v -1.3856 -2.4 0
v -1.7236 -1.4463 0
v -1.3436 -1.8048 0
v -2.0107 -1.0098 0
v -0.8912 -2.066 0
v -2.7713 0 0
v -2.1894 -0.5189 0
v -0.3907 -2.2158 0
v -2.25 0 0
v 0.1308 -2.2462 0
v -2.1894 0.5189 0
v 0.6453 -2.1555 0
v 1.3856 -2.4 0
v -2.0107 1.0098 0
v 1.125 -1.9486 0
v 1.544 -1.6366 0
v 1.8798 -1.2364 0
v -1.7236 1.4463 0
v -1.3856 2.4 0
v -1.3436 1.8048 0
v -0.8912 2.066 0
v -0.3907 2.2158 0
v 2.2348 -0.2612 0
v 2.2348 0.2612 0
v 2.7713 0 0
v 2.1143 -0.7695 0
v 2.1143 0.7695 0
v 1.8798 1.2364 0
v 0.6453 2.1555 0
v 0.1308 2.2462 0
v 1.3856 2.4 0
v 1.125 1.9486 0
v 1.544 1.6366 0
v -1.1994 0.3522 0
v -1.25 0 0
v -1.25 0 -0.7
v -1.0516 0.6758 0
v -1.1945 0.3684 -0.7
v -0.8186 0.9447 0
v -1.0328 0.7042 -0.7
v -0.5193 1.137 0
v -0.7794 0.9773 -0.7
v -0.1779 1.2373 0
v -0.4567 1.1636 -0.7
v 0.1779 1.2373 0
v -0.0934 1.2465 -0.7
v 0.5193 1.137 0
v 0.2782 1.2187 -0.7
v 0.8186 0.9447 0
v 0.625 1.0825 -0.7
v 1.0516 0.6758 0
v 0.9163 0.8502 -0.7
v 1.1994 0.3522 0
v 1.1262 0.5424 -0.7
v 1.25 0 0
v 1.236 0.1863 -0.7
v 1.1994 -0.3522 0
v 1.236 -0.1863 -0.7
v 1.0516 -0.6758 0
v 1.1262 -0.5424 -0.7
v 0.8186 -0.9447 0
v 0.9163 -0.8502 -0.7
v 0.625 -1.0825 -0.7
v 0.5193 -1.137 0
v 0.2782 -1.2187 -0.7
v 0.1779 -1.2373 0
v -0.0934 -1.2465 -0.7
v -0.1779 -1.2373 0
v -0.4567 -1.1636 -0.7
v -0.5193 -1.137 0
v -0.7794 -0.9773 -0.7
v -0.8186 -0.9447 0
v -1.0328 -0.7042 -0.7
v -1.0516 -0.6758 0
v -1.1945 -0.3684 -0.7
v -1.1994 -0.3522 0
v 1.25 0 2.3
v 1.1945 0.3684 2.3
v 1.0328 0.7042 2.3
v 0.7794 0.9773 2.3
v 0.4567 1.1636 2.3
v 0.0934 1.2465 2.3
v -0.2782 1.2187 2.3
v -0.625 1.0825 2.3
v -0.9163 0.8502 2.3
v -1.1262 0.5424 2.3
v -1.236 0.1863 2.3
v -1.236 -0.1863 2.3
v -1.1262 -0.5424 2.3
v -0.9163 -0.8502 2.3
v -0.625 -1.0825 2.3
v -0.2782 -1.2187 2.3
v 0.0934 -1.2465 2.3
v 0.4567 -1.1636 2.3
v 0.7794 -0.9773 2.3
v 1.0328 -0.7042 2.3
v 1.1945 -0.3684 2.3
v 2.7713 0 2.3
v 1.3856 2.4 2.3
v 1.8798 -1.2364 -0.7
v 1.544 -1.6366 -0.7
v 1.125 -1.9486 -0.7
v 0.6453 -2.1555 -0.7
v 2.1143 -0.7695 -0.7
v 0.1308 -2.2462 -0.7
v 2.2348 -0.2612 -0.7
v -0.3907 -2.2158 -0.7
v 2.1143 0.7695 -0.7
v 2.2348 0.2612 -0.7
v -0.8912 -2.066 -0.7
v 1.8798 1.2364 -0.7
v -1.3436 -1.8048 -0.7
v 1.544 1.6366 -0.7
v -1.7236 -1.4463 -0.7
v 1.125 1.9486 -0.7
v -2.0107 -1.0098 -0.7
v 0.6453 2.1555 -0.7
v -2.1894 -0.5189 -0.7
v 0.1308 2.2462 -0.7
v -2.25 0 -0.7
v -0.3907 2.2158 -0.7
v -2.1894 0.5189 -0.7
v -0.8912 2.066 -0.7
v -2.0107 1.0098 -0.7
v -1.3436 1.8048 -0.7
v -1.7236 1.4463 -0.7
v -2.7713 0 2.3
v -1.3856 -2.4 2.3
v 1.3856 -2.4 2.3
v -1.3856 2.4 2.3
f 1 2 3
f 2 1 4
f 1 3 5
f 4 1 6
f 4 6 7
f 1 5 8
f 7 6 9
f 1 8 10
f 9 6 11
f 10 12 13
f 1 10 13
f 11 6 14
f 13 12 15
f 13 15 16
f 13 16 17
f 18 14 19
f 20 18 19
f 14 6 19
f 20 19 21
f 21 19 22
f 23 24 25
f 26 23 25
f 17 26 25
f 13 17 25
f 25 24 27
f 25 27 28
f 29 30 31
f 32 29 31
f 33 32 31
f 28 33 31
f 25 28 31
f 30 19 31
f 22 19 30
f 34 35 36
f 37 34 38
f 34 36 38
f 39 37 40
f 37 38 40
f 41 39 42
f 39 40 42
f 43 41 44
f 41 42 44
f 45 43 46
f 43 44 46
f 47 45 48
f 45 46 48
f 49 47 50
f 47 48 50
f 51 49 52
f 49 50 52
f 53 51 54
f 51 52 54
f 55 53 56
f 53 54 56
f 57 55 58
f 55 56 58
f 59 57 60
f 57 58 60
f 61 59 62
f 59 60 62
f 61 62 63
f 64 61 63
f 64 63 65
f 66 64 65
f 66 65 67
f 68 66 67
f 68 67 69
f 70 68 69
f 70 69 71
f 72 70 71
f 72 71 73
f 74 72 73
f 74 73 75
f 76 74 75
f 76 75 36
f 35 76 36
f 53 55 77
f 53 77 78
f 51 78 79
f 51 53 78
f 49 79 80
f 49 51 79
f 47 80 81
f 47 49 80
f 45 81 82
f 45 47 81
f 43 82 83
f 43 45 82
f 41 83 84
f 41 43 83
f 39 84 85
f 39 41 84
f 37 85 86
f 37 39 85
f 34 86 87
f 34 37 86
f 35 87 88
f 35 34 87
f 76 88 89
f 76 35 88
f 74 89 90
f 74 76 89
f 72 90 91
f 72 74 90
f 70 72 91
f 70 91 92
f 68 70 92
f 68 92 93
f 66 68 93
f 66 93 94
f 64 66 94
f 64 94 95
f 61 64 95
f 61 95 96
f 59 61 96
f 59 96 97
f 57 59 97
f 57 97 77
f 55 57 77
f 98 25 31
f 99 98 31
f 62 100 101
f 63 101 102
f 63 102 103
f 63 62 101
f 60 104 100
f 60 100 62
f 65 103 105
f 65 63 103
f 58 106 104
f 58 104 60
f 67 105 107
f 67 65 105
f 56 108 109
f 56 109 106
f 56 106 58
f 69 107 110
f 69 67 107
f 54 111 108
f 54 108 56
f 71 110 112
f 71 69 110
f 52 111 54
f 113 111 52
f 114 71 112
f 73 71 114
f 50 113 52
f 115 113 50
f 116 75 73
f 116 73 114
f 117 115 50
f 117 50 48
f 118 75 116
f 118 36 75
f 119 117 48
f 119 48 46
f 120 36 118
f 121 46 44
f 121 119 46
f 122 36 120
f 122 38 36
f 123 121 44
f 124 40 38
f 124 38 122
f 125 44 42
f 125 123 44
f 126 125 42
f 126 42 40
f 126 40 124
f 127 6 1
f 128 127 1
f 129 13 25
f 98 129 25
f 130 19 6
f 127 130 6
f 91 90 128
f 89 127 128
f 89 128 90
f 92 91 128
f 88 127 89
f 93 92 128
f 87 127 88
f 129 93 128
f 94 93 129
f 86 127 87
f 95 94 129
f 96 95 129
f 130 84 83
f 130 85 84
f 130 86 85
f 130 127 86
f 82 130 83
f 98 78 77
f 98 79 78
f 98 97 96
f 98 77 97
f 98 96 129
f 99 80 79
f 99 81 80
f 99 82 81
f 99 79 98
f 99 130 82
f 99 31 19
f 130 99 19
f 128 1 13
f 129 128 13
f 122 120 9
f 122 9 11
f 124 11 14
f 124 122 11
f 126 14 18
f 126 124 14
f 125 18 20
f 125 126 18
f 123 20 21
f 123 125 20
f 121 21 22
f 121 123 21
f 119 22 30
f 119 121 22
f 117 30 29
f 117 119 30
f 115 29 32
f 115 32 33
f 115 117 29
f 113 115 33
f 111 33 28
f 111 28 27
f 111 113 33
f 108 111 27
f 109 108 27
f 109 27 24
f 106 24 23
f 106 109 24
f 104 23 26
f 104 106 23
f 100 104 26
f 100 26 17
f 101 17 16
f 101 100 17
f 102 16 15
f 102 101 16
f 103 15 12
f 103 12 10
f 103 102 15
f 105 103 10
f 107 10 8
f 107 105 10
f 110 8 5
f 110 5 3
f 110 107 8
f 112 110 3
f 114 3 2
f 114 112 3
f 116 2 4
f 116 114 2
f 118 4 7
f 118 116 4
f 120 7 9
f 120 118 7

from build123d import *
from build123d.topology import SkipClean

# Parameters (mm, degrees)
SKETCH_1_R      = 1.25
EXTRUDE_1_DEPTH = 2.3
EXTRUDE_START   = 0.7
SKETCH_2_R      = 2.25
SKETCH_2_R_2    = 1.25
EXTRUDE_2_DEPTH = 0.7


with BuildPart() as part:
    # 草图1 → 凸台-拉伸1 (new body)
    with BuildSketch(Plane.XY):
        Polygon((-1.385640646, 2.4), (-2.771281292, 0), (-1.385640646, -2.4), (1.385640646, -2.4), (2.771281292, 0), (1.385640646, 2.4), align=None)
        Circle(SKETCH_1_R, mode=Mode.SUBTRACT)
    extrude(amount=EXTRUDE_1_DEPTH)

    # 草图2 → 凸台-拉伸2 (add)
    with SkipClean():  # the faces are left unmerged after this step: merging them gives an invalid solid
        with BuildSketch(Plane(origin=(0, 0, 0), x_dir=(-1, 0, 0), z_dir=(0, 0, -1)).offset(EXTRUDE_START)):
            Circle(SKETCH_2_R)
            Circle(SKETCH_2_R_2, mode=Mode.SUBTRACT)
        extrude(amount=-EXTRUDE_2_DEPTH)


solid = part.part
